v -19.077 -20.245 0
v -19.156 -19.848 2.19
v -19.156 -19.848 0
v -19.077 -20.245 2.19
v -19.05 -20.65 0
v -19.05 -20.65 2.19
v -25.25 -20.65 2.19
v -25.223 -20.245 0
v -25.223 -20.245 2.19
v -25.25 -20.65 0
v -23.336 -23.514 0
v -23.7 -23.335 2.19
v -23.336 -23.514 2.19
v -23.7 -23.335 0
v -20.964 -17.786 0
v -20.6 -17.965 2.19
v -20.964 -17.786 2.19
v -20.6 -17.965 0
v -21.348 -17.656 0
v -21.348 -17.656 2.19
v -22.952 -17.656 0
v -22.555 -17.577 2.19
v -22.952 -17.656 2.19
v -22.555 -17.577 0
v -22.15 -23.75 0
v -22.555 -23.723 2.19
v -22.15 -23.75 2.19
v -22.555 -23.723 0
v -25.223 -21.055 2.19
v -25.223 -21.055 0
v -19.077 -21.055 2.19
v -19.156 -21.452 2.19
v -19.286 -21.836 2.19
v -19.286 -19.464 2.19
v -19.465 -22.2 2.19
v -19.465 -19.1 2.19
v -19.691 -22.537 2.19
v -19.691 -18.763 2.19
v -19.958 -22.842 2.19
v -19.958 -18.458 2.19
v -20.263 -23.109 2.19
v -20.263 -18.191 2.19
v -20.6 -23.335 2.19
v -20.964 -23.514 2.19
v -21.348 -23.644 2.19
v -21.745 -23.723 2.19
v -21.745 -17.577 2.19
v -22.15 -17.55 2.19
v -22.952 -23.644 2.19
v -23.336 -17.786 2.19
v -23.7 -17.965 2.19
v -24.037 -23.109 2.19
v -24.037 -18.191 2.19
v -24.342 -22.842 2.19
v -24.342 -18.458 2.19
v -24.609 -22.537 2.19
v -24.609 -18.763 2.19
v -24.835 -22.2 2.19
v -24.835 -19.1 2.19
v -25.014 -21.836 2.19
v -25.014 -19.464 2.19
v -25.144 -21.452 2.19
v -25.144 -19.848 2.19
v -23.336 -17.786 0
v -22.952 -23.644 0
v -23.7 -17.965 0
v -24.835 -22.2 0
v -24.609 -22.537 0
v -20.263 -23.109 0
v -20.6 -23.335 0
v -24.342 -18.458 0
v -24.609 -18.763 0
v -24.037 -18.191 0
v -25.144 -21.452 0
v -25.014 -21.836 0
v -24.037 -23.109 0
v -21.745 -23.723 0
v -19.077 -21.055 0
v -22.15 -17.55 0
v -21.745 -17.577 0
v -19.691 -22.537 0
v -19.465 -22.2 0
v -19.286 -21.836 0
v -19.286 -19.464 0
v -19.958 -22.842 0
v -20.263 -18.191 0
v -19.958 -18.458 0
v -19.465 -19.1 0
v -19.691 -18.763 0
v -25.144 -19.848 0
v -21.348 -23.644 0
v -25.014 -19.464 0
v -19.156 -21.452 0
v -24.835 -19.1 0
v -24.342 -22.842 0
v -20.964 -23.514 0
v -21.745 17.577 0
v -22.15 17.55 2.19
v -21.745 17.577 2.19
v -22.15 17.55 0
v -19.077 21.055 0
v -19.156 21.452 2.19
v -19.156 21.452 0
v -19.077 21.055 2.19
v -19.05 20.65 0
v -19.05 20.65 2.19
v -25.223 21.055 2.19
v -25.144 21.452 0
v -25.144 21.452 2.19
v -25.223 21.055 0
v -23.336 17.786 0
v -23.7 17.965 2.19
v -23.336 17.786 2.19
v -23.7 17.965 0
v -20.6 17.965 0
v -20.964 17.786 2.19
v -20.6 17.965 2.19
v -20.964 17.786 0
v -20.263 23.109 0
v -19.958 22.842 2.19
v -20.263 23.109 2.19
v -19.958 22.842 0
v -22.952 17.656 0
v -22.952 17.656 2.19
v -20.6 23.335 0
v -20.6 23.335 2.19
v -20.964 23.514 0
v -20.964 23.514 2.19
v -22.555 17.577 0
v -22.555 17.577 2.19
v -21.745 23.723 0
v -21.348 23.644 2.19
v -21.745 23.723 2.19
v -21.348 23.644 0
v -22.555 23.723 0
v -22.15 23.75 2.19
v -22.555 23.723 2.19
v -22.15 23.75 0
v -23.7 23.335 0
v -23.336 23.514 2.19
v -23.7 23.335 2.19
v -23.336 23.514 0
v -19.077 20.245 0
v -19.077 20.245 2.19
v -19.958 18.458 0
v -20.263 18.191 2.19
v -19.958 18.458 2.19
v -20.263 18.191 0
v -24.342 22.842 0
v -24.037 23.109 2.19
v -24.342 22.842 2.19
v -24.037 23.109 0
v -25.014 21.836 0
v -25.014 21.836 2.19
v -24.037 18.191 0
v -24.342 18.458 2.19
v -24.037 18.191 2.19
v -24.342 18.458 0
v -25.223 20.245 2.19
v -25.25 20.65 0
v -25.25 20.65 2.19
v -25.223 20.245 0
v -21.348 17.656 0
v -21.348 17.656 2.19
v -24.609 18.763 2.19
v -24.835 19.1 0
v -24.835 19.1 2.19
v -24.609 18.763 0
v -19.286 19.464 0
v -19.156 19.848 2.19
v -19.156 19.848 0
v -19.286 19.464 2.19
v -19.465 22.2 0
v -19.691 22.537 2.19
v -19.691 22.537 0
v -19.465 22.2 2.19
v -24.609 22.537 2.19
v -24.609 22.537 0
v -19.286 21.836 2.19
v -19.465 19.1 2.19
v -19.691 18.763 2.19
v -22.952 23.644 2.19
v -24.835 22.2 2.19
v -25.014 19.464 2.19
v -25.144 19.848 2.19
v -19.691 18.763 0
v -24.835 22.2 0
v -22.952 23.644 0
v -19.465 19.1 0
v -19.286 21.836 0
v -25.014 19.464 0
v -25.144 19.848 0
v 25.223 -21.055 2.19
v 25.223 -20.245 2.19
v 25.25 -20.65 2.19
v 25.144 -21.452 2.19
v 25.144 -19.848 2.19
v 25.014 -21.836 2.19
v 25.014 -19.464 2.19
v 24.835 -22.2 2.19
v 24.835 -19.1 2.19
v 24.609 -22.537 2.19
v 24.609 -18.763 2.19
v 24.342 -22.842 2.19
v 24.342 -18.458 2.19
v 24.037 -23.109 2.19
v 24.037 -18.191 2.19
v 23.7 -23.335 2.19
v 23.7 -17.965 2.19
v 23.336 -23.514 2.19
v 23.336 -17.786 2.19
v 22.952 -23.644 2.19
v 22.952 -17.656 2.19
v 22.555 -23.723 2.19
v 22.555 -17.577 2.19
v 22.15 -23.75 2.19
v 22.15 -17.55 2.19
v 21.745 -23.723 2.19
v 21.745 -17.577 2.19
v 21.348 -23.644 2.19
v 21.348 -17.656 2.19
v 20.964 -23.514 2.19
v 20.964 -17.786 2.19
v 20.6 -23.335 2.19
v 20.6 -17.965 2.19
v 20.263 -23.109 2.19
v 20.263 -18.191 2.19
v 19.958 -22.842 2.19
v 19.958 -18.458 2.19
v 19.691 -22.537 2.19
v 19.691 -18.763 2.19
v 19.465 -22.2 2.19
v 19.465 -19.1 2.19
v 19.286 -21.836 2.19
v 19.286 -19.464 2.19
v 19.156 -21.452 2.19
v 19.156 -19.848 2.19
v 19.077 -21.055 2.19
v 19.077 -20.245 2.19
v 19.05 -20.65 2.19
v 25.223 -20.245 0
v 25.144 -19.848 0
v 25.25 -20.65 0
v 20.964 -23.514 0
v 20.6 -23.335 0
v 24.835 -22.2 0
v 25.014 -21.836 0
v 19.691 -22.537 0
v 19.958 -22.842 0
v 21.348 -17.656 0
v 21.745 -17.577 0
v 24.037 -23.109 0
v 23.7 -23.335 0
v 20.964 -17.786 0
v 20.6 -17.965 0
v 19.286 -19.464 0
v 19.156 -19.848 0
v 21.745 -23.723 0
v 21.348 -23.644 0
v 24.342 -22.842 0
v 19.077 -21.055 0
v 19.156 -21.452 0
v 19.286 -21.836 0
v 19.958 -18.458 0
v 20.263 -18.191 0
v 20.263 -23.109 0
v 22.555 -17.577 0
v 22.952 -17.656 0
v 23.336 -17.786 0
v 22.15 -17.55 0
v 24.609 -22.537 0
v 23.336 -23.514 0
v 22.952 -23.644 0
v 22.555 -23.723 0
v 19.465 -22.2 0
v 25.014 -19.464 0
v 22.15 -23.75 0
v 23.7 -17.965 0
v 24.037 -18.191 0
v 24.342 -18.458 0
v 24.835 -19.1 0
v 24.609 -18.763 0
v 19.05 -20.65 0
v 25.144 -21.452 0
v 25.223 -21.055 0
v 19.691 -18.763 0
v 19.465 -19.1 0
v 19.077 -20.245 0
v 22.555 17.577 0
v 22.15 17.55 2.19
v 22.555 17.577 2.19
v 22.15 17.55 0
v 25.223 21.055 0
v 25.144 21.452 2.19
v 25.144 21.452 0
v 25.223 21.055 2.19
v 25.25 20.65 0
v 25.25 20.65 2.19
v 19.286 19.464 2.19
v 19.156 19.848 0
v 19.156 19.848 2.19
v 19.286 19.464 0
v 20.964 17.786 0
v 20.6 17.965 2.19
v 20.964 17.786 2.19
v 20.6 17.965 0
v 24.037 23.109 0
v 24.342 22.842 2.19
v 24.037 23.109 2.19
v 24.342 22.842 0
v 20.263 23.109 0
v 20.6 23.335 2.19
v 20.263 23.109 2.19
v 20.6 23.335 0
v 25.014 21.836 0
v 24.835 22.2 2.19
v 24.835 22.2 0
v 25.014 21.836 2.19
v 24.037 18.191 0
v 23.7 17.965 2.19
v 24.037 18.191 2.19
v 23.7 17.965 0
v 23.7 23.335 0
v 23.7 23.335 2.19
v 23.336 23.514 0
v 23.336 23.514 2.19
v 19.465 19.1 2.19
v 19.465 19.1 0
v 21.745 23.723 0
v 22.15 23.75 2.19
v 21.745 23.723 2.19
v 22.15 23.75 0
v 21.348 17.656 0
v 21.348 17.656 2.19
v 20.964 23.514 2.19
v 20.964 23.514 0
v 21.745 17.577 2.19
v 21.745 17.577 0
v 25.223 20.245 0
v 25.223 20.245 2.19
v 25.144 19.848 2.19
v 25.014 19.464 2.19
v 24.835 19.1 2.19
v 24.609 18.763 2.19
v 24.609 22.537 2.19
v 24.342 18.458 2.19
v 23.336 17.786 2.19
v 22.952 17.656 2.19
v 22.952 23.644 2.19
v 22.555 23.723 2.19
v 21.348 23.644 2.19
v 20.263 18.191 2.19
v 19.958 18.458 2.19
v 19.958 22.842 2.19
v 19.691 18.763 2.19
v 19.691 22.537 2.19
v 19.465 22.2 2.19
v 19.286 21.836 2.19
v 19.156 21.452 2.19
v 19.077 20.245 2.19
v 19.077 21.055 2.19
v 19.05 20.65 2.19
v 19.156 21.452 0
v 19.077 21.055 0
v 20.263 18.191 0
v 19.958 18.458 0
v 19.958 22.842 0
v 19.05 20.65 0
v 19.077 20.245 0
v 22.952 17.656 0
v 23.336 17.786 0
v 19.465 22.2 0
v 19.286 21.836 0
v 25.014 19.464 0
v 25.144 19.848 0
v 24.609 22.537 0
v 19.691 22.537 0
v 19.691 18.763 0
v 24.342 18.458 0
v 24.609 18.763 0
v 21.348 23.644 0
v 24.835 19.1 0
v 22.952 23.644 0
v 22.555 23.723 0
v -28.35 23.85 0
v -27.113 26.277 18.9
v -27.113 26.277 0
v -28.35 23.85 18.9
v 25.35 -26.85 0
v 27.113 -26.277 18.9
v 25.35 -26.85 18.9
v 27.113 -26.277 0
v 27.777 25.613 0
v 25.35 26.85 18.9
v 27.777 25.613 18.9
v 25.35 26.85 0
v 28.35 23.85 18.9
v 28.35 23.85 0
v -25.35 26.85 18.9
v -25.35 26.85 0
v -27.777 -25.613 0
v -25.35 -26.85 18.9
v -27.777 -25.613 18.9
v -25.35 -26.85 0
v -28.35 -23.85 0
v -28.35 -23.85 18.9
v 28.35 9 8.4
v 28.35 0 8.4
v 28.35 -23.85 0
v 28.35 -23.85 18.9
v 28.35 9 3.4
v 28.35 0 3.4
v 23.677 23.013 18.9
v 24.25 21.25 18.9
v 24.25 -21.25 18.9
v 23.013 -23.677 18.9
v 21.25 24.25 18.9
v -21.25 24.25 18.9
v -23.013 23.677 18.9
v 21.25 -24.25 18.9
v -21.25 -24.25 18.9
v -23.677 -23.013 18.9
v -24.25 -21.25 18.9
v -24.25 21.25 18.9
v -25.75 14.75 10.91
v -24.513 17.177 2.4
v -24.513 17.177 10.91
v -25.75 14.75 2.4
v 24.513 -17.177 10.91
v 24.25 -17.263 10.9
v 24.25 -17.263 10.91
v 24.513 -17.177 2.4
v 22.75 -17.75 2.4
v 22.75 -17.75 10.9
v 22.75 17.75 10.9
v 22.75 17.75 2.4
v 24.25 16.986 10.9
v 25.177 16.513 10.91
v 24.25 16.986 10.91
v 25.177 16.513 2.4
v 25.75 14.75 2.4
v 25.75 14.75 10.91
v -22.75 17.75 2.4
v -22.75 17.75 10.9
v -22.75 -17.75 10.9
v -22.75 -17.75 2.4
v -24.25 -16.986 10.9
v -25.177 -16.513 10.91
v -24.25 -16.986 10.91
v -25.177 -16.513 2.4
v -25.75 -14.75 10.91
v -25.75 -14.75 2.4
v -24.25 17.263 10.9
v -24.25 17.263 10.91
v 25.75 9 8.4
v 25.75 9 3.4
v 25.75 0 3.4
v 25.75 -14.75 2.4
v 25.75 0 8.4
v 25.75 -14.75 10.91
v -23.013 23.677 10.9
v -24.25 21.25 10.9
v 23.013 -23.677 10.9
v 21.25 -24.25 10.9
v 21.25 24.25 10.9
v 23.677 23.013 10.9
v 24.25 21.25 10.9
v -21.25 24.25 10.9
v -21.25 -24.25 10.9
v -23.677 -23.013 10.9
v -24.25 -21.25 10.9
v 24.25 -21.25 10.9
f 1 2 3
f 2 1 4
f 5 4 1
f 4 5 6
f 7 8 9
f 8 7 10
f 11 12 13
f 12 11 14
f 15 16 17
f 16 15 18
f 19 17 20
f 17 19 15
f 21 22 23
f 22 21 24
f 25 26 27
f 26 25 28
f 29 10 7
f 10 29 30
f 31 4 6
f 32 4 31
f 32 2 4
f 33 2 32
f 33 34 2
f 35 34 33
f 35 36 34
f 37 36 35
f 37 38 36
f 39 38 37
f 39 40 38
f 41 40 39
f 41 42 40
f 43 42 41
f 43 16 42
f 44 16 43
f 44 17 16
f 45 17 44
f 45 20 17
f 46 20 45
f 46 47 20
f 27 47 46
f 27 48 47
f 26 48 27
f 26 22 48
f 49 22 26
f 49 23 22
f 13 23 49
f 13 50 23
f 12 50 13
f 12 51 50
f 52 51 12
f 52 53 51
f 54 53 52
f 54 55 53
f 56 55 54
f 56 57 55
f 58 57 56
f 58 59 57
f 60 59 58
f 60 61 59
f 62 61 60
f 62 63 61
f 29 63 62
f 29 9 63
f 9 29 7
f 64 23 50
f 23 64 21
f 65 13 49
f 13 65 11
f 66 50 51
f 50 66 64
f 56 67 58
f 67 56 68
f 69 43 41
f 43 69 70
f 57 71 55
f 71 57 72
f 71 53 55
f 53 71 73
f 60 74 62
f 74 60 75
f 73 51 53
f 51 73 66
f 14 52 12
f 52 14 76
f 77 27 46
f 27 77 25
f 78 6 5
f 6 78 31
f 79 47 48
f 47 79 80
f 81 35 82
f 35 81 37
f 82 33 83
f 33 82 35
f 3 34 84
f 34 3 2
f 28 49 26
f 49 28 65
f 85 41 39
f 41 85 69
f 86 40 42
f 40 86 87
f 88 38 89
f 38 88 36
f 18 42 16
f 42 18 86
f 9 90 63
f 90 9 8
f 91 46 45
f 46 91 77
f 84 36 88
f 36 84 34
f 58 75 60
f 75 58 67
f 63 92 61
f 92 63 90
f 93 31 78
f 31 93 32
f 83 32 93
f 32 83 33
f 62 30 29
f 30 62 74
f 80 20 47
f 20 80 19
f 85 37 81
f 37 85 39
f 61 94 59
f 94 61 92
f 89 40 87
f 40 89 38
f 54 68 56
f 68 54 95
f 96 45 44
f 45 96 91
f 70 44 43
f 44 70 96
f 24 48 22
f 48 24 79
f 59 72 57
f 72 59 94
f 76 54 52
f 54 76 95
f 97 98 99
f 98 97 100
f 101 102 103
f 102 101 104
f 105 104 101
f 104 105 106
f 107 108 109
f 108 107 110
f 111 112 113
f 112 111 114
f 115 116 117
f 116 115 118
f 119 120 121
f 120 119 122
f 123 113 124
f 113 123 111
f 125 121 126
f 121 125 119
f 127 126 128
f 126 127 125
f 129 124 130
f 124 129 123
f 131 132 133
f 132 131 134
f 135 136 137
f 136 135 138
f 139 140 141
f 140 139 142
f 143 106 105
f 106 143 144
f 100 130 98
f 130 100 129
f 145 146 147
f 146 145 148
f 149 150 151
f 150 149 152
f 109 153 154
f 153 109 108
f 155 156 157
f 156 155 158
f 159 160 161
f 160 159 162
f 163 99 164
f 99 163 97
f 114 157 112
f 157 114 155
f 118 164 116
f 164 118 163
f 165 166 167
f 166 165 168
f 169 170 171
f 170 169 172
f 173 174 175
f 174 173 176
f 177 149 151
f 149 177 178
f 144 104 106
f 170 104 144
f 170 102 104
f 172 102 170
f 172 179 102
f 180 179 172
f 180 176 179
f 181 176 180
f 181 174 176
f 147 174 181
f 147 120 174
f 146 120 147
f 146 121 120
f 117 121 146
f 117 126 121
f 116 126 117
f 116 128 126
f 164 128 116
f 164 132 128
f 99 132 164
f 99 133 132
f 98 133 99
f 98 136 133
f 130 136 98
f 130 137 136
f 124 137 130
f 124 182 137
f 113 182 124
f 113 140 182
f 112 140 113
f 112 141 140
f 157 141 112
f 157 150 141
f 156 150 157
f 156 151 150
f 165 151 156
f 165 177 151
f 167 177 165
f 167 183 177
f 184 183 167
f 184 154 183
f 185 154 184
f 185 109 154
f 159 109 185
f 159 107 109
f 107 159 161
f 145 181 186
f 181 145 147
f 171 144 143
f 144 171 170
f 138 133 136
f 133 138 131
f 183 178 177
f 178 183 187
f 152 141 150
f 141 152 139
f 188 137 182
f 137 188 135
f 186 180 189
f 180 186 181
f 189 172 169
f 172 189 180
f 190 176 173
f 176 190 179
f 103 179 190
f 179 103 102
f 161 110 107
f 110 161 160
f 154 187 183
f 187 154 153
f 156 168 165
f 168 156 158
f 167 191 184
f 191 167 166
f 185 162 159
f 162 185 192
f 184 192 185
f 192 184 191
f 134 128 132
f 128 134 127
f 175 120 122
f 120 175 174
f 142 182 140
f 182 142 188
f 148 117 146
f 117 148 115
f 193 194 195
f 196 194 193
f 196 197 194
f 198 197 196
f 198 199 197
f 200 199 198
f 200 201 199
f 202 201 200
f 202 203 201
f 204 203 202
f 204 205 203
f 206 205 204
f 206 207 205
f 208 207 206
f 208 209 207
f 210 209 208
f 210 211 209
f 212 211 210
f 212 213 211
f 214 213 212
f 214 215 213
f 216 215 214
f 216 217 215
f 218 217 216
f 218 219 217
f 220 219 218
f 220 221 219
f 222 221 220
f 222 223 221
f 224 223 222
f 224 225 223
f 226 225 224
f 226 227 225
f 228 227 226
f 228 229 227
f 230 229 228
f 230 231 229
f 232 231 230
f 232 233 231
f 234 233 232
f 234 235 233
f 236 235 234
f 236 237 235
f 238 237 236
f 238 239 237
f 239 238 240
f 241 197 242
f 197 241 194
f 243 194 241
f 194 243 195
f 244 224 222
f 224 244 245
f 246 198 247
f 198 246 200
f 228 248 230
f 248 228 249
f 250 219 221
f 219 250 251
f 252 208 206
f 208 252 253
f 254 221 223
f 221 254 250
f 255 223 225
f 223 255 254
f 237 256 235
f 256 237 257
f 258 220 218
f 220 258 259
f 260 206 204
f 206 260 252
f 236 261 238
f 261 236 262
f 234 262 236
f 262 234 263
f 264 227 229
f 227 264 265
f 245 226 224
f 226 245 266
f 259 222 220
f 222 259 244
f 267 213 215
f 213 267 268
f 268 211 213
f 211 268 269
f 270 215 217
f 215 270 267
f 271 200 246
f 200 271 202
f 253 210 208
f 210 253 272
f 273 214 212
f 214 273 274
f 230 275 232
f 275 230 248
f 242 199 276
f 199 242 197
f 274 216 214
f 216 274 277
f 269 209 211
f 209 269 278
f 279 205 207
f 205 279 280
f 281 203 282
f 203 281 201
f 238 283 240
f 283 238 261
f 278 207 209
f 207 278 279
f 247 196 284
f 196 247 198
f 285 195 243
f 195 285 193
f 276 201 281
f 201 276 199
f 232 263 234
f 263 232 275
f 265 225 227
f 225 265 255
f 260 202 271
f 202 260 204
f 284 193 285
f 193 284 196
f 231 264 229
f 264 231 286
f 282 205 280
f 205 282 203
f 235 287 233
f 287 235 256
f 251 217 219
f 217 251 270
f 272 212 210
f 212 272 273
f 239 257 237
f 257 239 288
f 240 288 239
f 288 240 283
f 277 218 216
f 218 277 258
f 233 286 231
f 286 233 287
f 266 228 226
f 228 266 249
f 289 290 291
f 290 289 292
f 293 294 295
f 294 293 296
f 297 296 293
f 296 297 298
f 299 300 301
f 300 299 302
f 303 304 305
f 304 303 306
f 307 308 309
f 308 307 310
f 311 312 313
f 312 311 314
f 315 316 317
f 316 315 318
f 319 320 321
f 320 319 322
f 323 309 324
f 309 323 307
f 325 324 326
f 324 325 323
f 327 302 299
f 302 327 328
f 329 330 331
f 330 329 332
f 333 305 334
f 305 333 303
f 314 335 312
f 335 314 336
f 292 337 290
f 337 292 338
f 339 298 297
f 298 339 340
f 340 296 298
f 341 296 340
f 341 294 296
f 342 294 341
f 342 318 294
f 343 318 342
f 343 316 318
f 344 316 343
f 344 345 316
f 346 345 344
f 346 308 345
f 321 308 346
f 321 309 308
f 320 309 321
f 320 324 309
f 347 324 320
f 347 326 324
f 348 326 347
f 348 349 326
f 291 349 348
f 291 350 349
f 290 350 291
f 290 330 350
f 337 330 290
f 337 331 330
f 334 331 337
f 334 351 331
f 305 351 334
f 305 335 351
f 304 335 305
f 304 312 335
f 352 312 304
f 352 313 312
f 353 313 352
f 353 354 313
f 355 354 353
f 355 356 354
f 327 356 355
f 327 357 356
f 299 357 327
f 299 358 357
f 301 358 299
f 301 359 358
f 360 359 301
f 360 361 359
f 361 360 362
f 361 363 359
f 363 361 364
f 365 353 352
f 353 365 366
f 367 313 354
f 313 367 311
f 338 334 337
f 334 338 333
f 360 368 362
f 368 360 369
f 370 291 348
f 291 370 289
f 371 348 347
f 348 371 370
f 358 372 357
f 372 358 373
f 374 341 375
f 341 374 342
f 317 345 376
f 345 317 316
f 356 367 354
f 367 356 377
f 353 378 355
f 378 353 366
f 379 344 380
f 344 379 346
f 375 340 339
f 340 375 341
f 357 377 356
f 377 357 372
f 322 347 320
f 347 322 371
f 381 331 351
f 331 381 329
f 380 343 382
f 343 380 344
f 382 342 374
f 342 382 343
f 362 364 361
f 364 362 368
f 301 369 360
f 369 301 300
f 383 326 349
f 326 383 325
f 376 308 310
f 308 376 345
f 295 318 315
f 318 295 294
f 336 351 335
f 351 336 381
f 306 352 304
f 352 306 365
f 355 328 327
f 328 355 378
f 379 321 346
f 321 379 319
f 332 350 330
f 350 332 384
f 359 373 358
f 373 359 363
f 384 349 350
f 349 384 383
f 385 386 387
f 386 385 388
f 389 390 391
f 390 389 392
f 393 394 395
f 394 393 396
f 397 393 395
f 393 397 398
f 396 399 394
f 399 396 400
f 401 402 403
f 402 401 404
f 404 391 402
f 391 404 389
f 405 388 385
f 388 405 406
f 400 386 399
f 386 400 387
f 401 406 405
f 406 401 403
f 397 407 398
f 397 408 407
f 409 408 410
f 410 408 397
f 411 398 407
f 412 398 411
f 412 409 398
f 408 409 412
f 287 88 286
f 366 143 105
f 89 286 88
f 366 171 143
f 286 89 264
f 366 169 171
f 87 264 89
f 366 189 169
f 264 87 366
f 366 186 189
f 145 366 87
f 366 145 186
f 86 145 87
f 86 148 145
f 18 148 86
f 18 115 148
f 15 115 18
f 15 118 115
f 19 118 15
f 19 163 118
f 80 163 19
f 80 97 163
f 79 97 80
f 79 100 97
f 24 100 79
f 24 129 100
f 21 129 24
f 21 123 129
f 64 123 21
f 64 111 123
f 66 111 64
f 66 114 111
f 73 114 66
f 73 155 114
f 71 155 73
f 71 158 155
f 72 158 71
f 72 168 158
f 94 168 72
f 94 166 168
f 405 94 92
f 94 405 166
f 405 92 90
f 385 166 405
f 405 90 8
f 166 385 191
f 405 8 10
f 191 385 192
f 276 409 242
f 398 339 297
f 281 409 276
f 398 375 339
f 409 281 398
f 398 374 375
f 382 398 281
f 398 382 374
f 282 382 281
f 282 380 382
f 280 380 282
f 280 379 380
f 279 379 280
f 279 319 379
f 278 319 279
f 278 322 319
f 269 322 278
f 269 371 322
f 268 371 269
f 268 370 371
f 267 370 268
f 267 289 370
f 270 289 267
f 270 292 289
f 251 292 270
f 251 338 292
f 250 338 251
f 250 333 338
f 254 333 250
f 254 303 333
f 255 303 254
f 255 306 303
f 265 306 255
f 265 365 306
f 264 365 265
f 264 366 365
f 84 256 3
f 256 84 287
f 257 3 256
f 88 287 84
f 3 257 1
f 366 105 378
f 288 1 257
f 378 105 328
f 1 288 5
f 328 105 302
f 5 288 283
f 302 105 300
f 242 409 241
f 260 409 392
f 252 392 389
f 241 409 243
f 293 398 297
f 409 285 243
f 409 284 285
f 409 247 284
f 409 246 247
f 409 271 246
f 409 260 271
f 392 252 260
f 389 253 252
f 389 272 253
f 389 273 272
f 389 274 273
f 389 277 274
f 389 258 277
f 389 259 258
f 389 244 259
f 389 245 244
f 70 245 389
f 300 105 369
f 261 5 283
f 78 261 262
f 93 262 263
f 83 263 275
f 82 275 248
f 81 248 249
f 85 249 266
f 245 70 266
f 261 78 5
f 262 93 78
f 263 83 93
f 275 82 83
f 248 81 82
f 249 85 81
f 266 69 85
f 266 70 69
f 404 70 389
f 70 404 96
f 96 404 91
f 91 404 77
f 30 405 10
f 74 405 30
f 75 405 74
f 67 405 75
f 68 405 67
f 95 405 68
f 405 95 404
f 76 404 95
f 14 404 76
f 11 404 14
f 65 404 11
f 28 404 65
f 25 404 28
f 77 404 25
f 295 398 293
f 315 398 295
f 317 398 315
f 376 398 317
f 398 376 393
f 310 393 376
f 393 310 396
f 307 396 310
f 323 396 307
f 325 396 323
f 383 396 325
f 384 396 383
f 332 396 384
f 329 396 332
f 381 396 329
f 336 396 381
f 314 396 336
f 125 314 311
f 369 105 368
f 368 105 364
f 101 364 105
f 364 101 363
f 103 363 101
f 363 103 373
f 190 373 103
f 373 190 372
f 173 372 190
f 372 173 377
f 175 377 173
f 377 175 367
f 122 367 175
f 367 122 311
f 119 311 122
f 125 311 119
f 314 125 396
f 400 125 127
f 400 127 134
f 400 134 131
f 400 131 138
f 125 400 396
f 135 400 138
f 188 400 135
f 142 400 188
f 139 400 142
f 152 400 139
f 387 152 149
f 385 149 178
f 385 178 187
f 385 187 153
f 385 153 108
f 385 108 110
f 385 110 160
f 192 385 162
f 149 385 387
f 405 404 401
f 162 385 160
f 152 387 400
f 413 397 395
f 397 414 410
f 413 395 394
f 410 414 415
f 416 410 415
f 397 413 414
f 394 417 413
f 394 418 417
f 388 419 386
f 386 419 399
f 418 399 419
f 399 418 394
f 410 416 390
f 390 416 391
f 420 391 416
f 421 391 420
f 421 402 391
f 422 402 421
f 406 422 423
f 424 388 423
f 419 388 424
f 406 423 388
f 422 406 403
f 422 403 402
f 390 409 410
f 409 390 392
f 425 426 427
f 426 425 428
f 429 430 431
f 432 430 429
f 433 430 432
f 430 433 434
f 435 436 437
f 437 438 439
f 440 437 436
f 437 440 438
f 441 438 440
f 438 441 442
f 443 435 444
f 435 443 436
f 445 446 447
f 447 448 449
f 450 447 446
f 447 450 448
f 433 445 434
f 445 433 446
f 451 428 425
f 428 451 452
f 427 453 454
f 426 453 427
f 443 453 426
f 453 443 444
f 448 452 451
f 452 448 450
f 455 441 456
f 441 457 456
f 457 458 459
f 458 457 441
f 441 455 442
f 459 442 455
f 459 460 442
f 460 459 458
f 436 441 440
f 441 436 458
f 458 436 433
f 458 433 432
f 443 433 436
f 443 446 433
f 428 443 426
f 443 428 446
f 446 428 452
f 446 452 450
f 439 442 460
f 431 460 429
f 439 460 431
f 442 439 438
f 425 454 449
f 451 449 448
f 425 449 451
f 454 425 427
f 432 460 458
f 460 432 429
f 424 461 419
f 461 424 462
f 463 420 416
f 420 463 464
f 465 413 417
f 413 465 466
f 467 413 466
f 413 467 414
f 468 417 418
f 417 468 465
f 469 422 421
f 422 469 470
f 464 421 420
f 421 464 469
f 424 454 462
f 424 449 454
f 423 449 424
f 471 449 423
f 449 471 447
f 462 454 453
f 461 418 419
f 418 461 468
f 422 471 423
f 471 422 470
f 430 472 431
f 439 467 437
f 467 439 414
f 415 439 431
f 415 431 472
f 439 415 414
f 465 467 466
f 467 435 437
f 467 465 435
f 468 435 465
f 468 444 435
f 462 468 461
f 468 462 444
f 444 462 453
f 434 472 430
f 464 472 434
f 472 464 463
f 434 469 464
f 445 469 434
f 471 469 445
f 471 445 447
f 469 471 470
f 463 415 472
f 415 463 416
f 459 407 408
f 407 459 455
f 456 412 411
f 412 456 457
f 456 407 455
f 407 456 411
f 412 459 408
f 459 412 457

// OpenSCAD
// Battery base for the CrowPanel 1.28" rotary module.
//
// The module is already a finished 48 x 48 x 33 mm enclosure, so this does not
// wrap it: it is a tray carrying a lithium cell and a charger, with a pocket in
// its top that the module's lower 8 mm presses into. The module is the lid.
//
// make-case.py emits the same tray as a watertight STL without needing CAD.
// This file adds the features a mesh script cannot cut cleanly — the connector
// window, the magnet pockets and the cable notch — so render here when those
// are wanted. OpenSCAD: openscad -o base-tray.stl esprotary-base.scad

/* [Module] */
module_size   = 48.0;   // published by Elecrow; verify with fit-gauge.stl first
clearance     = 0.5;    // FDM parts come out tight
pocket_depth  = 8.0;    // how much of the module's 33 mm the tray grips

/* [Cell] */
cell_l = 50.0;  cell_w = 34.0;  cell_h = 5.0;   // 503450, 1000 mAh
cell_gap  = 1.5;
charger_h = 2.0;                                 // TP4056 lying flat

/* [Shell] */
wall = 2.6;  floor_t = 2.4;  corner_r = 3.0;

/* [Options] */
connector_window = true;    // opening for the 5 V input lead
magnet_pockets   = true;    // 6 x 2 mm discs, for a steel plate on the wall
magnet_d = 6.2;  magnet_h = 2.2;  magnet_inset = 1.0;

pocket   = module_size + clearance;
bay_x    = cell_l + cell_gap;
bay_y    = cell_w + cell_gap;
bay_h    = cell_h + charger_h + cell_gap;
out_x    = max(pocket, bay_x) + 2 * wall;
out_y    = max(pocket, bay_y) + 2 * wall;
step_z   = floor_t + bay_h;
total_h  = step_z + pocket_depth;

module rrect(x, y, h, r) {
  linear_extrude(h)
    offset(r = r) offset(r = -r) square([x, y], center = true);
}

module tray() {
  difference() {
    rrect(out_x, out_y, total_h, corner_r);

    translate([0, 0, floor_t])            rrect(bay_x, bay_y, bay_h + 0.01, corner_r);
    translate([0, 0, step_z])             rrect(pocket, pocket, pocket_depth + 0.1, corner_r);

    if (connector_window)
      translate([out_x / 2 - wall - 0.5, 0, floor_t + 1])
        cube([wall + 2, 9, 5], center = false);

    if (magnet_pockets)
      for (dx = [-1, 1], dy = [-1, 1])
        translate([dx * (out_x / 2 - magnet_d), dy * (out_y / 2 - magnet_d), -0.01])
          cylinder(h = magnet_h, d = magnet_d, $fn = 48);
  }
}

// A 6 mm slice of the pocket alone. Print this first: it costs minutes and a
// gram, and it is the only way to know whether 48.0 plus 0.5 is right for a
// module whose published size and whose STEP file disagree.
module fit_gauge() {
  difference() {
    rrect(pocket + 2 * wall, pocket + 2 * wall, 6, corner_r);
    translate([0, 0, -0.01]) rrect(pocket, pocket, 6.02, corner_r);
  }
}

tray();
// fit_gauge();
